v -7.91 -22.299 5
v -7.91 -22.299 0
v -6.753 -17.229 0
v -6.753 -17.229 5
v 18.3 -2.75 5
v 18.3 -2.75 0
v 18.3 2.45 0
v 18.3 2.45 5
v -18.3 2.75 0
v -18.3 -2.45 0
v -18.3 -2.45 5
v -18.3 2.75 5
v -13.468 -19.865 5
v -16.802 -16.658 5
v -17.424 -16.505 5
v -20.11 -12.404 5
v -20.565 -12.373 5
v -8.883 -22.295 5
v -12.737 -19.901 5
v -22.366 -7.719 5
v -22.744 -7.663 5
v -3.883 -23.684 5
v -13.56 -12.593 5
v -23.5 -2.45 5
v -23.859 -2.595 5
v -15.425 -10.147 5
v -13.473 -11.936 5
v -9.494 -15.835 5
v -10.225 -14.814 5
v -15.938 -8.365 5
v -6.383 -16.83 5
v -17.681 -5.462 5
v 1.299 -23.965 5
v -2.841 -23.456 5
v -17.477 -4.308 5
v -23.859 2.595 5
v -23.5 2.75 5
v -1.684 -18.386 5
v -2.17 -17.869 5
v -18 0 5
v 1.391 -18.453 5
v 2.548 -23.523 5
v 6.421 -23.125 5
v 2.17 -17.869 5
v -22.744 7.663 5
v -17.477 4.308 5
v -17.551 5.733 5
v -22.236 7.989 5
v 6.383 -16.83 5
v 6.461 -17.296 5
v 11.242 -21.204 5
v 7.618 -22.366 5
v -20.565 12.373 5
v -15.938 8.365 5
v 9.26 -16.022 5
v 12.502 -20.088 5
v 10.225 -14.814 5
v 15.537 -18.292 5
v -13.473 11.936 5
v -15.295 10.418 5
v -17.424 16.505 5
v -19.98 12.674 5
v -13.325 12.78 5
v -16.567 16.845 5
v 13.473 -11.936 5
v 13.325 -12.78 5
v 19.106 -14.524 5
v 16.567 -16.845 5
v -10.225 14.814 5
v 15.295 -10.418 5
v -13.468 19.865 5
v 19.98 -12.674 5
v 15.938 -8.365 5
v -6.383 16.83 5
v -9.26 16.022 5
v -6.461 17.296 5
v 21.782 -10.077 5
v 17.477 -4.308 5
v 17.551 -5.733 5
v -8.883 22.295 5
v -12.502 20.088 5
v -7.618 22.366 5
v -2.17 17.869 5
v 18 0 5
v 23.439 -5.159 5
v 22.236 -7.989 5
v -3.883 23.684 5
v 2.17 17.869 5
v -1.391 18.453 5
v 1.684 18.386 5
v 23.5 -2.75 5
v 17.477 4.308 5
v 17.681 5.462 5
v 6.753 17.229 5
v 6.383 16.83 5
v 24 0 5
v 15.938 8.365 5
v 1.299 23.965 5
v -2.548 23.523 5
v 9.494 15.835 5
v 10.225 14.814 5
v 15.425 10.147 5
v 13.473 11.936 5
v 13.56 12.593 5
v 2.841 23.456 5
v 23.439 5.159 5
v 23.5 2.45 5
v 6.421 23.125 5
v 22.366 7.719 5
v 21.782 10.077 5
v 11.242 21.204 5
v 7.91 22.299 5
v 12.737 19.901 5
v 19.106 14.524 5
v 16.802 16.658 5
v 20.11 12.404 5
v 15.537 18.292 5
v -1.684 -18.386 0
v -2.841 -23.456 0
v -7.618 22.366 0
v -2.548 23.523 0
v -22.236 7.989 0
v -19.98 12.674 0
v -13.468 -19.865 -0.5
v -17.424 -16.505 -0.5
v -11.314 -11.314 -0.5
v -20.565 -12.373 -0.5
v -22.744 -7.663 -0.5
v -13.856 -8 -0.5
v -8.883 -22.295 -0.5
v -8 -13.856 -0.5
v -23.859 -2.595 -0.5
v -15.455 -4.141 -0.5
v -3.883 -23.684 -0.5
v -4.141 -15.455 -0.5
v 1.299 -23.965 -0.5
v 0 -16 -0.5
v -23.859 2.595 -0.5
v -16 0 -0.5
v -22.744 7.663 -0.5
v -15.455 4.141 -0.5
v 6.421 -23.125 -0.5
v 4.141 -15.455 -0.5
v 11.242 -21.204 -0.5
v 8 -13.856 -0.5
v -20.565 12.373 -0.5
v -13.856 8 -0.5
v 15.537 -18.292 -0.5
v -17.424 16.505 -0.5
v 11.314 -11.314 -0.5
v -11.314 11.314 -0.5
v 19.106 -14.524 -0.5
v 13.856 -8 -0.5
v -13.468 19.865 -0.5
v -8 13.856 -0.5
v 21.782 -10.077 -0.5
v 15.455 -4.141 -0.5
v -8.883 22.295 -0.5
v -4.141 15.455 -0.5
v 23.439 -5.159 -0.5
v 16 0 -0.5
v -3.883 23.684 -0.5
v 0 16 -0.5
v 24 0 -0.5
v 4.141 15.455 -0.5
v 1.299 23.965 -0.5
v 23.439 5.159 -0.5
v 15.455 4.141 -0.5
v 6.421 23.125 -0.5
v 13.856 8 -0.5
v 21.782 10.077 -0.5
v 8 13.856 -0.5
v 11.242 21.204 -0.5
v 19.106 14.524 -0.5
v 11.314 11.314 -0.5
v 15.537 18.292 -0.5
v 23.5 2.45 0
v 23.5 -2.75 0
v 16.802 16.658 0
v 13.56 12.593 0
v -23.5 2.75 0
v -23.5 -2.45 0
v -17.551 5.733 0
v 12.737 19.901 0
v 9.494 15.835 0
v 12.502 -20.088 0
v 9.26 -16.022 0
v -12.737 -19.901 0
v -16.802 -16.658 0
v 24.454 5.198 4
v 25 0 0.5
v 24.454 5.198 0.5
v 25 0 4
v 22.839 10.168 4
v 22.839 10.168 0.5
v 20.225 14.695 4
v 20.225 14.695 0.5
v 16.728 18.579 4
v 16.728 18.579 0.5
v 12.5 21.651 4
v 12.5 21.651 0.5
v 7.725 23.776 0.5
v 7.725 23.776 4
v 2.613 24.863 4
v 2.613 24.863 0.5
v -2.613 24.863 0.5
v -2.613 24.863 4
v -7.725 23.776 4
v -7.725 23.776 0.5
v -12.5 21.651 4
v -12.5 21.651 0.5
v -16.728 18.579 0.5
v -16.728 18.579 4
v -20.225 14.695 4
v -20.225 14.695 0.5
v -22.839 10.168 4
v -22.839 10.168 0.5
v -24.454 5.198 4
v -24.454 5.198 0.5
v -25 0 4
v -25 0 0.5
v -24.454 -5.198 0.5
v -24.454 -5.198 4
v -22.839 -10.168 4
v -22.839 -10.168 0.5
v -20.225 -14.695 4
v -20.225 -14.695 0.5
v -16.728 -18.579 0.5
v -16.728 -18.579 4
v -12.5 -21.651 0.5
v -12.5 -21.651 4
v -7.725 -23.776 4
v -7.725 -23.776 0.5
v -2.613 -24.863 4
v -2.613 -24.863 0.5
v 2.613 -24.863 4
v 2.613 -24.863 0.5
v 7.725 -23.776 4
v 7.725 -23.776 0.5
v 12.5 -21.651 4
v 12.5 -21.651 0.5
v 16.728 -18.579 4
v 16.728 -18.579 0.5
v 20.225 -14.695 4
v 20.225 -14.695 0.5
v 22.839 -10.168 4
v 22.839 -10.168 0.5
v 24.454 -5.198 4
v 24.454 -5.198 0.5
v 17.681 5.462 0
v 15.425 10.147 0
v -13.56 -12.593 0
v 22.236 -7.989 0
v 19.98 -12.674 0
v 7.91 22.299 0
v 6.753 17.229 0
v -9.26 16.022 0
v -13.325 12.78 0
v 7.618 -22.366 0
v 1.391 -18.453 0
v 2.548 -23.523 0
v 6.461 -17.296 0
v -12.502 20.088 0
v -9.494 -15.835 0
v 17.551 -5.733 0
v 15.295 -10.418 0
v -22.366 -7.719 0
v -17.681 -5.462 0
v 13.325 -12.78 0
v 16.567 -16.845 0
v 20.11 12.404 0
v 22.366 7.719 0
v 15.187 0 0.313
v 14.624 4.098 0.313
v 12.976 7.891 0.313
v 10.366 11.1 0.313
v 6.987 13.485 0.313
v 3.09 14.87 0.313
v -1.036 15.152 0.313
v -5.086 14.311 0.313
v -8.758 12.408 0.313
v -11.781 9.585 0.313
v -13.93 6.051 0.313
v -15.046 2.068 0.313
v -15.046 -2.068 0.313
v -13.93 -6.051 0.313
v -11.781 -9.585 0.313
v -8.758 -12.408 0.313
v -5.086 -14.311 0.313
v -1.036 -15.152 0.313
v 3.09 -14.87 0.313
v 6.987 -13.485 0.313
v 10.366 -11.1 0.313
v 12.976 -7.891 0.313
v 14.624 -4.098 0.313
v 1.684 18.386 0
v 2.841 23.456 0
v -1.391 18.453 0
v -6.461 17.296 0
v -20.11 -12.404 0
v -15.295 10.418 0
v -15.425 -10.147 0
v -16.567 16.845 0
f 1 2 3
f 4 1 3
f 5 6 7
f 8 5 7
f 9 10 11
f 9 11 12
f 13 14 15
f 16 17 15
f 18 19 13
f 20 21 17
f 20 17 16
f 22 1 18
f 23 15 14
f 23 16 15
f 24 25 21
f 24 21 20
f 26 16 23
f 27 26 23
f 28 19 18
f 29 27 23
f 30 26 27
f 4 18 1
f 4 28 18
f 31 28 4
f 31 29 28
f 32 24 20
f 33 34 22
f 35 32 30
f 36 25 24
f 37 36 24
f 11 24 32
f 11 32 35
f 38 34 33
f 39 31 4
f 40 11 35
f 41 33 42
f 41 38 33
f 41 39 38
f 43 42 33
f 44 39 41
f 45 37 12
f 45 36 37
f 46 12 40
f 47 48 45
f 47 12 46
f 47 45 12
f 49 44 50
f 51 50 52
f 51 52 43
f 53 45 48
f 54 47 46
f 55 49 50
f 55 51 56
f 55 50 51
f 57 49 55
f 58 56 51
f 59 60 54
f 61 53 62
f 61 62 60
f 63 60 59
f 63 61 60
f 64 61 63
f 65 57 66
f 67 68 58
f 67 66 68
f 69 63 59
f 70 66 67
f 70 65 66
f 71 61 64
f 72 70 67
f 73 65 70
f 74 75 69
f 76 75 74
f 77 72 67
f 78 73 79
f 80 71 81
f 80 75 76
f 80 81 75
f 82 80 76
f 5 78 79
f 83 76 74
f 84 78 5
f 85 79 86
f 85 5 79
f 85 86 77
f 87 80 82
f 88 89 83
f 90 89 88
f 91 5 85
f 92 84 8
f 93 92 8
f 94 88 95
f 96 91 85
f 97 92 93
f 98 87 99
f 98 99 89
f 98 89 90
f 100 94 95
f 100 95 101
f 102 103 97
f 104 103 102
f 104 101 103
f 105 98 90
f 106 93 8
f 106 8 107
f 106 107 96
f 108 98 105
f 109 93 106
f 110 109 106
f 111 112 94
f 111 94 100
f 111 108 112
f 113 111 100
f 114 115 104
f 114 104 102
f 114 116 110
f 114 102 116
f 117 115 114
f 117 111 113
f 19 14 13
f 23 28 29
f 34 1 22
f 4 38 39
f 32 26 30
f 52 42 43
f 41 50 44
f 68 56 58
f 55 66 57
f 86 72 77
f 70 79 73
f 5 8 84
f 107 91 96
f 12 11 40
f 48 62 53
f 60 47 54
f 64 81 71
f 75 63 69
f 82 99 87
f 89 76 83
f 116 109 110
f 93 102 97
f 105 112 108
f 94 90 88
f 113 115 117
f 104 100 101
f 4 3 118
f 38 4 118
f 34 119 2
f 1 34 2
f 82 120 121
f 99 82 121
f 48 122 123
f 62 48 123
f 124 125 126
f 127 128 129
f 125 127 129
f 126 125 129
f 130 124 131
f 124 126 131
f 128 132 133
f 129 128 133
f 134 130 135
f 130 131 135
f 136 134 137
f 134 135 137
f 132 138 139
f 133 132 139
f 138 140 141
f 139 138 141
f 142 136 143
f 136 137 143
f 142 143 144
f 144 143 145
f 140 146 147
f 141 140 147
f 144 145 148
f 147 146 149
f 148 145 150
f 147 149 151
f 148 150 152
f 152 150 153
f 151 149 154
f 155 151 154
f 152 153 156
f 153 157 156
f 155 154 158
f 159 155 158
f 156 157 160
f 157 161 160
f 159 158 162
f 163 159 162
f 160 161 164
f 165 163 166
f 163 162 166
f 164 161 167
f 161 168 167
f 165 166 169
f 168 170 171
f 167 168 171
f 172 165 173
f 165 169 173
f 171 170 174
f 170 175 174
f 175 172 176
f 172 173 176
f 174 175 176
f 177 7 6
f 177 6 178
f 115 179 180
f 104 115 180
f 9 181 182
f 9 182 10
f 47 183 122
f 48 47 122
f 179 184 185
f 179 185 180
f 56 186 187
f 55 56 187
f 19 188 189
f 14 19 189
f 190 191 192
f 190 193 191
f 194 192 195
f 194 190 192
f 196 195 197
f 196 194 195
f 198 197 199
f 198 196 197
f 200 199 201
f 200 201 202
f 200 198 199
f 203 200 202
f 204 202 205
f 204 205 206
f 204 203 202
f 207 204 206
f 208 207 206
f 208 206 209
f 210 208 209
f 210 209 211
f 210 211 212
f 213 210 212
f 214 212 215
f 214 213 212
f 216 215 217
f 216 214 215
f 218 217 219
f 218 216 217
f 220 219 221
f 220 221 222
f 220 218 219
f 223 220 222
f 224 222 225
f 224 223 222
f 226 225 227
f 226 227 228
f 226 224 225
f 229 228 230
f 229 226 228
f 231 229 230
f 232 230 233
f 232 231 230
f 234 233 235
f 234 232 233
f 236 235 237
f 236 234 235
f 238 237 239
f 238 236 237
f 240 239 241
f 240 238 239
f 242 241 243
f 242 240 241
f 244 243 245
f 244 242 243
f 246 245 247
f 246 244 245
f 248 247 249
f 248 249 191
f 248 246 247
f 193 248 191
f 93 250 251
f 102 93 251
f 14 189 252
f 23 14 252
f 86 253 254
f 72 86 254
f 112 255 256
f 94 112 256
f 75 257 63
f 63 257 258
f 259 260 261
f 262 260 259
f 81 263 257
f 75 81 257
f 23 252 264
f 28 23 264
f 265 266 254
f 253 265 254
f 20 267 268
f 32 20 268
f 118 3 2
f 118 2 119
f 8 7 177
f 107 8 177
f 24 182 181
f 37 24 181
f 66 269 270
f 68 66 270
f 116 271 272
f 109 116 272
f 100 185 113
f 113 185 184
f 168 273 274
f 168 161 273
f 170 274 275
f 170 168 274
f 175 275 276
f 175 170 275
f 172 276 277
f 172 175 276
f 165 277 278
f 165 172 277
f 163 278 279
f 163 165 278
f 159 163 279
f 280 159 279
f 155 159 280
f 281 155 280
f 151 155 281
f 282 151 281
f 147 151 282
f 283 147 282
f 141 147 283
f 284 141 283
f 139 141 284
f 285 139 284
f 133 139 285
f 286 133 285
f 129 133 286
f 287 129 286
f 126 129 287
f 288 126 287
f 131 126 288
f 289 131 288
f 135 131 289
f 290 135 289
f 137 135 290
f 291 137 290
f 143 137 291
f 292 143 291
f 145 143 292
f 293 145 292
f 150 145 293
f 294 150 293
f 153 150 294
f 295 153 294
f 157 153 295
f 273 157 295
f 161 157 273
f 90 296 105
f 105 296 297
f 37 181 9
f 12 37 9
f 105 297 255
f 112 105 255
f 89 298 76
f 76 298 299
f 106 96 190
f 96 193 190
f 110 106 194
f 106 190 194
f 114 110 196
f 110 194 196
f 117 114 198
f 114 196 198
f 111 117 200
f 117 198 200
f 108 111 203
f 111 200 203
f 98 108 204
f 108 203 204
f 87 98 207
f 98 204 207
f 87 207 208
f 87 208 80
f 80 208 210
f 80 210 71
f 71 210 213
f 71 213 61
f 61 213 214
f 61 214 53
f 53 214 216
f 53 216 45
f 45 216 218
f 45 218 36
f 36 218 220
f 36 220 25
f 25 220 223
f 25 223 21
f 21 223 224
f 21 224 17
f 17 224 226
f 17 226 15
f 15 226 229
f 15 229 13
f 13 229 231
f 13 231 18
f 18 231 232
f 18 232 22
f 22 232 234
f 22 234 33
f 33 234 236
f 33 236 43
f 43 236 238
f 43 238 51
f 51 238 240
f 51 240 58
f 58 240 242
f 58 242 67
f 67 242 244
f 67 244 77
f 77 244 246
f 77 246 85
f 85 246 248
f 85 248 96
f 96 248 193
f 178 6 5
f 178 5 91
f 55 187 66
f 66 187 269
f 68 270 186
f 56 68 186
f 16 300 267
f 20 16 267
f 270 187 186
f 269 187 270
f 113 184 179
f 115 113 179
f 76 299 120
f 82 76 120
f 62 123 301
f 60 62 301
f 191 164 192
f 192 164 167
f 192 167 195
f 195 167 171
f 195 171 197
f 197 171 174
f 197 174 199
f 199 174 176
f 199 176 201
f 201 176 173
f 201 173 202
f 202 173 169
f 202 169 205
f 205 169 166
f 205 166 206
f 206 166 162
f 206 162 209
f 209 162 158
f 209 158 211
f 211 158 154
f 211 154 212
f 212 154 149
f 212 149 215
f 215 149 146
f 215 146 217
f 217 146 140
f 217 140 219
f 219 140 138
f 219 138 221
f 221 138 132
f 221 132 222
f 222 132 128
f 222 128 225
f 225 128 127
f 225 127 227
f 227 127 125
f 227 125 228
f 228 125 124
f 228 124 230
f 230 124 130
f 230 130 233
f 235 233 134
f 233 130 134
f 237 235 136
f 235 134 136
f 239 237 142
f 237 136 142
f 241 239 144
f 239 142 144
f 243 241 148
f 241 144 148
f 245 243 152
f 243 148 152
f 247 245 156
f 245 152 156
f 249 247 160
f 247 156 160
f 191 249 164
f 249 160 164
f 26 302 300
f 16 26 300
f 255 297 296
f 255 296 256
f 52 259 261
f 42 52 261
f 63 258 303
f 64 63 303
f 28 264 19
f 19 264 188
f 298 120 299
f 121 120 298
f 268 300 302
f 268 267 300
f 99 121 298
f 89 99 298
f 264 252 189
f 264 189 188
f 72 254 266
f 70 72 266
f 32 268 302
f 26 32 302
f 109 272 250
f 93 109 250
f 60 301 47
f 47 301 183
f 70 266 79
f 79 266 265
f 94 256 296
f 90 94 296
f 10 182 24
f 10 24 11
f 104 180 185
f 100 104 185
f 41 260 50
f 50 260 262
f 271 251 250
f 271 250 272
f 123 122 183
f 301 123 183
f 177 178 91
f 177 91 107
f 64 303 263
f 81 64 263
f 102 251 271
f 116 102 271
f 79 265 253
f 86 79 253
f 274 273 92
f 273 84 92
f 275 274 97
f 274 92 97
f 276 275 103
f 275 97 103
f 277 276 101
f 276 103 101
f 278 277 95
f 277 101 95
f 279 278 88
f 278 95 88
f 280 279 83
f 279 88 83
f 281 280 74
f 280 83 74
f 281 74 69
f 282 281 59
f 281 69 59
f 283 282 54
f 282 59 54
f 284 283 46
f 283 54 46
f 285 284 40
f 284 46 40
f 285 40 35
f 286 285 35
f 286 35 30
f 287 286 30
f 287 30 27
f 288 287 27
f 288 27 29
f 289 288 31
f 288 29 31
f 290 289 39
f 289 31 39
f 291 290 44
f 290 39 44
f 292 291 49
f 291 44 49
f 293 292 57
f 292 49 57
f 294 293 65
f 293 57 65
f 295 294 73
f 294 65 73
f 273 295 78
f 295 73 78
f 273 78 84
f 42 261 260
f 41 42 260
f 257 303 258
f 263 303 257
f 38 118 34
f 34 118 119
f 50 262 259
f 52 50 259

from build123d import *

# Parameters (mm, degrees)
F0_R     = 25
F0_W     = 5.2
F0_H     = 5.2
F0_R_2   = 15
F1_DEPTH = 5
F2_DEPTH = 0.5
F3_SIZE2 = 2.99999
F3_SIZE  = 4.99999


# Not quite as in the source:
# - a fillet or chamfer that OpenCascade refuses, or shapes differently, is made with other operations: its cross-section is extruded or revolved along the edge and cut away or added
# - a fillet or chamfer is up to 0.001 mm smaller than in the source, because OpenCascade refuses the exact size


with BuildPart() as f1:
    # F0 (on Top) → F1 (new body)
    with BuildSketch(Plane.XY):
        Circle(F0_R)
        Polygon((-12.7365232116, -19.9005898526), (-16.8020469205, -16.6584428829), (-13.5598999508, -12.5929191741), (-9.494376242, -15.8350661437), align=None, mode=Mode.SUBTRACT)
        Polygon((-2.8406685631, -23.4559822245), (-7.9102937065, -22.2988733679), (-6.7531848499, -17.2292482245), (-1.6835597066, -18.3863570811), align=None, mode=Mode.SUBTRACT)
        Polygon((-20.1097532349, -12.4036415956), (-22.3659486783, -7.7186034825), (-17.6809105652, -5.4624080391), (-15.4247151218, -10.1474461522), align=None, mode=Mode.SUBTRACT)
        Polygon((7.6178153328, -22.3656296481), (2.5481901895, -23.5227385047), (1.3910813329, -18.4531133613), (6.4607064762, -17.2960045047), align=None, mode=Mode.SUBTRACT)
        Polygon((16.5674974757, -16.8454898234), (12.5019737669, -20.0876367931), (9.2598267972, -16.0221130843), (13.3253505061, -12.7799661146), align=None, mode=Mode.SUBTRACT)
        Polygon((22.2357835565, -7.9888941429), (19.9795881131, -12.673932256), (15.29455, -10.4177368126), (17.5507454435, -5.7326986995), align=None, mode=Mode.SUBTRACT)
        with Locations((20.9, -0.15)):
            Rectangle(F0_W, F0_H, mode=Mode.SUBTRACT)
        with Locations((-20.9, 0.15)):
            Rectangle(F0_W, F0_H, mode=Mode.SUBTRACT)
        Polygon((-22.2357835565, 7.9888941429), (-19.9795881131, 12.673932256), (-15.29455, 10.4177368126), (-17.5507454435, 5.7326986995), align=None, mode=Mode.SUBTRACT)
        Polygon((-16.5674974757, 16.8454898234), (-12.5019737669, 20.0876367931), (-9.2598267972, 16.0221130843), (-13.3253505061, 12.7799661146), align=None, mode=Mode.SUBTRACT)
        Polygon((-7.6178153328, 22.3656296481), (-2.5481901895, 23.5227385047), (-1.3910813329, 18.4531133613), (-6.4607064762, 17.2960045047), align=None, mode=Mode.SUBTRACT)
        Circle(F0_R_2, mode=Mode.SUBTRACT)
        Polygon((20.1097532349, 12.4036415956), (22.3659486783, 7.7186034825), (17.6809105652, 5.4624080391), (15.4247151218, 10.1474461522), align=None, mode=Mode.SUBTRACT)
        Polygon((2.8406685631, 23.4559822245), (7.9102937065, 22.2988733679), (6.7531848499, 17.2292482245), (1.6835597066, 18.3863570811), align=None, mode=Mode.SUBTRACT)
        Polygon((12.7365232116, 19.9005898526), (16.8020469205, 16.6584428829), (13.5598999508, 12.5929191741), (9.494376242, 15.8350661437), align=None, mode=Mode.SUBTRACT)
    extrude(amount=F1_DEPTH)

    # F0 (on Top) → F2 (join)
    with BuildSketch(Plane.XY):
        Circle(F0_R)
        Polygon((-12.7365232116, -19.9005898526), (-16.8020469205, -16.6584428829), (-13.5598999508, -12.5929191741), (-9.494376242, -15.8350661437), align=None, mode=Mode.SUBTRACT)
        Polygon((-2.8406685631, -23.4559822245), (-7.9102937065, -22.2988733679), (-6.7531848499, -17.2292482245), (-1.6835597066, -18.3863570811), align=None, mode=Mode.SUBTRACT)
        Polygon((-20.1097532349, -12.4036415956), (-22.3659486783, -7.7186034825), (-17.6809105652, -5.4624080391), (-15.4247151218, -10.1474461522), align=None, mode=Mode.SUBTRACT)
        Polygon((7.6178153328, -22.3656296481), (2.5481901895, -23.5227385047), (1.3910813329, -18.4531133613), (6.4607064762, -17.2960045047), align=None, mode=Mode.SUBTRACT)
        Polygon((16.5674974757, -16.8454898234), (12.5019737669, -20.0876367931), (9.2598267972, -16.0221130843), (13.3253505061, -12.7799661146), align=None, mode=Mode.SUBTRACT)
        Polygon((22.2357835565, -7.9888941429), (19.9795881131, -12.673932256), (15.29455, -10.4177368126), (17.5507454435, -5.7326986995), align=None, mode=Mode.SUBTRACT)
        with Locations((20.9, -0.15)):
            Rectangle(F0_W, F0_H, mode=Mode.SUBTRACT)
        with Locations((-20.9, 0.15)):
            Rectangle(F0_W, F0_H, mode=Mode.SUBTRACT)
        Polygon((-22.2357835565, 7.9888941429), (-19.9795881131, 12.673932256), (-15.29455, 10.4177368126), (-17.5507454435, 5.7326986995), align=None, mode=Mode.SUBTRACT)
        Polygon((-16.5674974757, 16.8454898234), (-12.5019737669, 20.0876367931), (-9.2598267972, 16.0221130843), (-13.3253505061, 12.7799661146), align=None, mode=Mode.SUBTRACT)
        Polygon((-7.6178153328, 22.3656296481), (-2.5481901895, 23.5227385047), (-1.3910813329, 18.4531133613), (-6.4607064762, 17.2960045047), align=None, mode=Mode.SUBTRACT)
        Circle(F0_R_2, mode=Mode.SUBTRACT)
        Polygon((20.1097532349, 12.4036415956), (22.3659486783, 7.7186034825), (17.6809105652, 5.4624080391), (15.4247151218, 10.1474461522), align=None, mode=Mode.SUBTRACT)
        Polygon((2.8406685631, 23.4559822245), (7.9102937065, 22.2988733679), (6.7531848499, 17.2292482245), (1.6835597066, 18.3863570811), align=None, mode=Mode.SUBTRACT)
        Polygon((12.7365232116, 19.9005898526), (16.8020469205, 16.6584428829), (13.5598999508, 12.5929191741), (9.494376242, 15.8350661437), align=None, mode=Mode.SUBTRACT)
        Polygon((-15.29455, 10.4177368126), (-19.9795881131, 12.673932256), (-22.2357835565, 7.9888941429), (-17.5507454435, 5.7326986995), align=None)
        Polygon((-9.2598267972, 16.0221130843), (-12.5019737669, 20.0876367931), (-16.5674974757, 16.8454898234), (-13.3253505061, 12.7799661146), align=None)
        Polygon((-1.3910813329, 18.4531133613), (-2.5481901895, 23.5227385047), (-7.6178153328, 22.3656296481), (-6.4607064762, 17.2960045047), align=None)
        Polygon((6.7531848499, 17.2292482245), (7.9102937065, 22.2988733679), (2.8406685631, 23.4559822245), (1.6835597066, 18.3863570811), align=None)
        Polygon((13.5598999508, 12.5929191741), (16.8020469205, 16.6584428829), (12.7365232116, 19.9005898526), (9.494376242, 15.8350661437), align=None)
        Polygon((17.6809105652, 5.4624080391), (22.3659486783, 7.7186034825), (20.1097532349, 12.4036415956), (15.4247151218, 10.1474461522), align=None)
        with Locations((20.9, -0.15)):
            Rectangle(F0_W, F0_H)
        Polygon((15.29455, -10.4177368126), (19.9795881131, -12.673932256), (22.2357835565, -7.9888941429), (17.5507454435, -5.7326986995), align=None)
        Polygon((9.2598267972, -16.0221130843), (12.5019737669, -20.0876367931), (16.5674974757, -16.8454898234), (13.3253505061, -12.7799661146), align=None)
        with Locations((-20.9, 0.15)):
            Rectangle(F0_W, F0_H)
        Polygon((-13.5598999508, -12.5929191741), (-16.8020469205, -16.6584428829), (-12.7365232116, -19.9005898526), (-9.494376242, -15.8350661437), align=None)
        Polygon((-17.6809105652, -5.4624080391), (-22.3659486783, -7.7186034825), (-20.1097532349, -12.4036415956), (-15.4247151218, -10.1474461522), align=None)
        Polygon((-6.7531848499, -17.2292482245), (-7.9102937065, -22.2988733679), (-2.8406685631, -23.4559822245), (-1.6835597066, -18.3863570811), align=None)
        Polygon((1.3910813329, -18.4531133613), (2.5481901895, -23.5227385047), (7.6178153328, -22.3656296481), (6.4607064762, -17.2960045047), align=None)
    extrude(amount=-F2_DEPTH)

    # F3 (size 5 and 3 in the source; OpenCascade refuses exactly that, so slightly less here)
    f3_edges = [f1.edges().sort_by_distance(p)[0] for p in [
        (-15, 0, 5),
    ]]
    f3_side = f1.faces().sort_by_distance((-15, 0, 2.5))[0]
    chamfer(f3_edges, length=F3_SIZE, length2=F3_SIZE2, reference=f3_side)

    # F4: chamfer of 1 on 3 edges, made by hand

    # F4_s1 → F4_t2 (revolve, cut)
    with BuildSketch(Plane.XZ):
        Polygon((24, 5), (25, 4), (25, 5), align=None)
    revolve(axis=Axis((0, 0, 5), (0, 0, 1)), mode=Mode.SUBTRACT)

    # F4_s3 → F4_t4 (revolve, cut)
    with BuildSketch(Plane.XZ):
        Polygon((25, 0.5), (24, -0.5), (25, -0.5), align=None)
    revolve(axis=Axis((0, 0, -0.5), (0, 0, 1)), mode=Mode.SUBTRACT)

    # F4_s5 → F4_t6 (revolve, cut)
    with BuildSketch(Plane.XZ):
        Polygon((15, 0.5), (16, -0.5), (15, -0.5), align=None)
    revolve(axis=Axis((0, 0, -0.5), (0, 0, 1)), mode=Mode.SUBTRACT)


solid = f1.part
